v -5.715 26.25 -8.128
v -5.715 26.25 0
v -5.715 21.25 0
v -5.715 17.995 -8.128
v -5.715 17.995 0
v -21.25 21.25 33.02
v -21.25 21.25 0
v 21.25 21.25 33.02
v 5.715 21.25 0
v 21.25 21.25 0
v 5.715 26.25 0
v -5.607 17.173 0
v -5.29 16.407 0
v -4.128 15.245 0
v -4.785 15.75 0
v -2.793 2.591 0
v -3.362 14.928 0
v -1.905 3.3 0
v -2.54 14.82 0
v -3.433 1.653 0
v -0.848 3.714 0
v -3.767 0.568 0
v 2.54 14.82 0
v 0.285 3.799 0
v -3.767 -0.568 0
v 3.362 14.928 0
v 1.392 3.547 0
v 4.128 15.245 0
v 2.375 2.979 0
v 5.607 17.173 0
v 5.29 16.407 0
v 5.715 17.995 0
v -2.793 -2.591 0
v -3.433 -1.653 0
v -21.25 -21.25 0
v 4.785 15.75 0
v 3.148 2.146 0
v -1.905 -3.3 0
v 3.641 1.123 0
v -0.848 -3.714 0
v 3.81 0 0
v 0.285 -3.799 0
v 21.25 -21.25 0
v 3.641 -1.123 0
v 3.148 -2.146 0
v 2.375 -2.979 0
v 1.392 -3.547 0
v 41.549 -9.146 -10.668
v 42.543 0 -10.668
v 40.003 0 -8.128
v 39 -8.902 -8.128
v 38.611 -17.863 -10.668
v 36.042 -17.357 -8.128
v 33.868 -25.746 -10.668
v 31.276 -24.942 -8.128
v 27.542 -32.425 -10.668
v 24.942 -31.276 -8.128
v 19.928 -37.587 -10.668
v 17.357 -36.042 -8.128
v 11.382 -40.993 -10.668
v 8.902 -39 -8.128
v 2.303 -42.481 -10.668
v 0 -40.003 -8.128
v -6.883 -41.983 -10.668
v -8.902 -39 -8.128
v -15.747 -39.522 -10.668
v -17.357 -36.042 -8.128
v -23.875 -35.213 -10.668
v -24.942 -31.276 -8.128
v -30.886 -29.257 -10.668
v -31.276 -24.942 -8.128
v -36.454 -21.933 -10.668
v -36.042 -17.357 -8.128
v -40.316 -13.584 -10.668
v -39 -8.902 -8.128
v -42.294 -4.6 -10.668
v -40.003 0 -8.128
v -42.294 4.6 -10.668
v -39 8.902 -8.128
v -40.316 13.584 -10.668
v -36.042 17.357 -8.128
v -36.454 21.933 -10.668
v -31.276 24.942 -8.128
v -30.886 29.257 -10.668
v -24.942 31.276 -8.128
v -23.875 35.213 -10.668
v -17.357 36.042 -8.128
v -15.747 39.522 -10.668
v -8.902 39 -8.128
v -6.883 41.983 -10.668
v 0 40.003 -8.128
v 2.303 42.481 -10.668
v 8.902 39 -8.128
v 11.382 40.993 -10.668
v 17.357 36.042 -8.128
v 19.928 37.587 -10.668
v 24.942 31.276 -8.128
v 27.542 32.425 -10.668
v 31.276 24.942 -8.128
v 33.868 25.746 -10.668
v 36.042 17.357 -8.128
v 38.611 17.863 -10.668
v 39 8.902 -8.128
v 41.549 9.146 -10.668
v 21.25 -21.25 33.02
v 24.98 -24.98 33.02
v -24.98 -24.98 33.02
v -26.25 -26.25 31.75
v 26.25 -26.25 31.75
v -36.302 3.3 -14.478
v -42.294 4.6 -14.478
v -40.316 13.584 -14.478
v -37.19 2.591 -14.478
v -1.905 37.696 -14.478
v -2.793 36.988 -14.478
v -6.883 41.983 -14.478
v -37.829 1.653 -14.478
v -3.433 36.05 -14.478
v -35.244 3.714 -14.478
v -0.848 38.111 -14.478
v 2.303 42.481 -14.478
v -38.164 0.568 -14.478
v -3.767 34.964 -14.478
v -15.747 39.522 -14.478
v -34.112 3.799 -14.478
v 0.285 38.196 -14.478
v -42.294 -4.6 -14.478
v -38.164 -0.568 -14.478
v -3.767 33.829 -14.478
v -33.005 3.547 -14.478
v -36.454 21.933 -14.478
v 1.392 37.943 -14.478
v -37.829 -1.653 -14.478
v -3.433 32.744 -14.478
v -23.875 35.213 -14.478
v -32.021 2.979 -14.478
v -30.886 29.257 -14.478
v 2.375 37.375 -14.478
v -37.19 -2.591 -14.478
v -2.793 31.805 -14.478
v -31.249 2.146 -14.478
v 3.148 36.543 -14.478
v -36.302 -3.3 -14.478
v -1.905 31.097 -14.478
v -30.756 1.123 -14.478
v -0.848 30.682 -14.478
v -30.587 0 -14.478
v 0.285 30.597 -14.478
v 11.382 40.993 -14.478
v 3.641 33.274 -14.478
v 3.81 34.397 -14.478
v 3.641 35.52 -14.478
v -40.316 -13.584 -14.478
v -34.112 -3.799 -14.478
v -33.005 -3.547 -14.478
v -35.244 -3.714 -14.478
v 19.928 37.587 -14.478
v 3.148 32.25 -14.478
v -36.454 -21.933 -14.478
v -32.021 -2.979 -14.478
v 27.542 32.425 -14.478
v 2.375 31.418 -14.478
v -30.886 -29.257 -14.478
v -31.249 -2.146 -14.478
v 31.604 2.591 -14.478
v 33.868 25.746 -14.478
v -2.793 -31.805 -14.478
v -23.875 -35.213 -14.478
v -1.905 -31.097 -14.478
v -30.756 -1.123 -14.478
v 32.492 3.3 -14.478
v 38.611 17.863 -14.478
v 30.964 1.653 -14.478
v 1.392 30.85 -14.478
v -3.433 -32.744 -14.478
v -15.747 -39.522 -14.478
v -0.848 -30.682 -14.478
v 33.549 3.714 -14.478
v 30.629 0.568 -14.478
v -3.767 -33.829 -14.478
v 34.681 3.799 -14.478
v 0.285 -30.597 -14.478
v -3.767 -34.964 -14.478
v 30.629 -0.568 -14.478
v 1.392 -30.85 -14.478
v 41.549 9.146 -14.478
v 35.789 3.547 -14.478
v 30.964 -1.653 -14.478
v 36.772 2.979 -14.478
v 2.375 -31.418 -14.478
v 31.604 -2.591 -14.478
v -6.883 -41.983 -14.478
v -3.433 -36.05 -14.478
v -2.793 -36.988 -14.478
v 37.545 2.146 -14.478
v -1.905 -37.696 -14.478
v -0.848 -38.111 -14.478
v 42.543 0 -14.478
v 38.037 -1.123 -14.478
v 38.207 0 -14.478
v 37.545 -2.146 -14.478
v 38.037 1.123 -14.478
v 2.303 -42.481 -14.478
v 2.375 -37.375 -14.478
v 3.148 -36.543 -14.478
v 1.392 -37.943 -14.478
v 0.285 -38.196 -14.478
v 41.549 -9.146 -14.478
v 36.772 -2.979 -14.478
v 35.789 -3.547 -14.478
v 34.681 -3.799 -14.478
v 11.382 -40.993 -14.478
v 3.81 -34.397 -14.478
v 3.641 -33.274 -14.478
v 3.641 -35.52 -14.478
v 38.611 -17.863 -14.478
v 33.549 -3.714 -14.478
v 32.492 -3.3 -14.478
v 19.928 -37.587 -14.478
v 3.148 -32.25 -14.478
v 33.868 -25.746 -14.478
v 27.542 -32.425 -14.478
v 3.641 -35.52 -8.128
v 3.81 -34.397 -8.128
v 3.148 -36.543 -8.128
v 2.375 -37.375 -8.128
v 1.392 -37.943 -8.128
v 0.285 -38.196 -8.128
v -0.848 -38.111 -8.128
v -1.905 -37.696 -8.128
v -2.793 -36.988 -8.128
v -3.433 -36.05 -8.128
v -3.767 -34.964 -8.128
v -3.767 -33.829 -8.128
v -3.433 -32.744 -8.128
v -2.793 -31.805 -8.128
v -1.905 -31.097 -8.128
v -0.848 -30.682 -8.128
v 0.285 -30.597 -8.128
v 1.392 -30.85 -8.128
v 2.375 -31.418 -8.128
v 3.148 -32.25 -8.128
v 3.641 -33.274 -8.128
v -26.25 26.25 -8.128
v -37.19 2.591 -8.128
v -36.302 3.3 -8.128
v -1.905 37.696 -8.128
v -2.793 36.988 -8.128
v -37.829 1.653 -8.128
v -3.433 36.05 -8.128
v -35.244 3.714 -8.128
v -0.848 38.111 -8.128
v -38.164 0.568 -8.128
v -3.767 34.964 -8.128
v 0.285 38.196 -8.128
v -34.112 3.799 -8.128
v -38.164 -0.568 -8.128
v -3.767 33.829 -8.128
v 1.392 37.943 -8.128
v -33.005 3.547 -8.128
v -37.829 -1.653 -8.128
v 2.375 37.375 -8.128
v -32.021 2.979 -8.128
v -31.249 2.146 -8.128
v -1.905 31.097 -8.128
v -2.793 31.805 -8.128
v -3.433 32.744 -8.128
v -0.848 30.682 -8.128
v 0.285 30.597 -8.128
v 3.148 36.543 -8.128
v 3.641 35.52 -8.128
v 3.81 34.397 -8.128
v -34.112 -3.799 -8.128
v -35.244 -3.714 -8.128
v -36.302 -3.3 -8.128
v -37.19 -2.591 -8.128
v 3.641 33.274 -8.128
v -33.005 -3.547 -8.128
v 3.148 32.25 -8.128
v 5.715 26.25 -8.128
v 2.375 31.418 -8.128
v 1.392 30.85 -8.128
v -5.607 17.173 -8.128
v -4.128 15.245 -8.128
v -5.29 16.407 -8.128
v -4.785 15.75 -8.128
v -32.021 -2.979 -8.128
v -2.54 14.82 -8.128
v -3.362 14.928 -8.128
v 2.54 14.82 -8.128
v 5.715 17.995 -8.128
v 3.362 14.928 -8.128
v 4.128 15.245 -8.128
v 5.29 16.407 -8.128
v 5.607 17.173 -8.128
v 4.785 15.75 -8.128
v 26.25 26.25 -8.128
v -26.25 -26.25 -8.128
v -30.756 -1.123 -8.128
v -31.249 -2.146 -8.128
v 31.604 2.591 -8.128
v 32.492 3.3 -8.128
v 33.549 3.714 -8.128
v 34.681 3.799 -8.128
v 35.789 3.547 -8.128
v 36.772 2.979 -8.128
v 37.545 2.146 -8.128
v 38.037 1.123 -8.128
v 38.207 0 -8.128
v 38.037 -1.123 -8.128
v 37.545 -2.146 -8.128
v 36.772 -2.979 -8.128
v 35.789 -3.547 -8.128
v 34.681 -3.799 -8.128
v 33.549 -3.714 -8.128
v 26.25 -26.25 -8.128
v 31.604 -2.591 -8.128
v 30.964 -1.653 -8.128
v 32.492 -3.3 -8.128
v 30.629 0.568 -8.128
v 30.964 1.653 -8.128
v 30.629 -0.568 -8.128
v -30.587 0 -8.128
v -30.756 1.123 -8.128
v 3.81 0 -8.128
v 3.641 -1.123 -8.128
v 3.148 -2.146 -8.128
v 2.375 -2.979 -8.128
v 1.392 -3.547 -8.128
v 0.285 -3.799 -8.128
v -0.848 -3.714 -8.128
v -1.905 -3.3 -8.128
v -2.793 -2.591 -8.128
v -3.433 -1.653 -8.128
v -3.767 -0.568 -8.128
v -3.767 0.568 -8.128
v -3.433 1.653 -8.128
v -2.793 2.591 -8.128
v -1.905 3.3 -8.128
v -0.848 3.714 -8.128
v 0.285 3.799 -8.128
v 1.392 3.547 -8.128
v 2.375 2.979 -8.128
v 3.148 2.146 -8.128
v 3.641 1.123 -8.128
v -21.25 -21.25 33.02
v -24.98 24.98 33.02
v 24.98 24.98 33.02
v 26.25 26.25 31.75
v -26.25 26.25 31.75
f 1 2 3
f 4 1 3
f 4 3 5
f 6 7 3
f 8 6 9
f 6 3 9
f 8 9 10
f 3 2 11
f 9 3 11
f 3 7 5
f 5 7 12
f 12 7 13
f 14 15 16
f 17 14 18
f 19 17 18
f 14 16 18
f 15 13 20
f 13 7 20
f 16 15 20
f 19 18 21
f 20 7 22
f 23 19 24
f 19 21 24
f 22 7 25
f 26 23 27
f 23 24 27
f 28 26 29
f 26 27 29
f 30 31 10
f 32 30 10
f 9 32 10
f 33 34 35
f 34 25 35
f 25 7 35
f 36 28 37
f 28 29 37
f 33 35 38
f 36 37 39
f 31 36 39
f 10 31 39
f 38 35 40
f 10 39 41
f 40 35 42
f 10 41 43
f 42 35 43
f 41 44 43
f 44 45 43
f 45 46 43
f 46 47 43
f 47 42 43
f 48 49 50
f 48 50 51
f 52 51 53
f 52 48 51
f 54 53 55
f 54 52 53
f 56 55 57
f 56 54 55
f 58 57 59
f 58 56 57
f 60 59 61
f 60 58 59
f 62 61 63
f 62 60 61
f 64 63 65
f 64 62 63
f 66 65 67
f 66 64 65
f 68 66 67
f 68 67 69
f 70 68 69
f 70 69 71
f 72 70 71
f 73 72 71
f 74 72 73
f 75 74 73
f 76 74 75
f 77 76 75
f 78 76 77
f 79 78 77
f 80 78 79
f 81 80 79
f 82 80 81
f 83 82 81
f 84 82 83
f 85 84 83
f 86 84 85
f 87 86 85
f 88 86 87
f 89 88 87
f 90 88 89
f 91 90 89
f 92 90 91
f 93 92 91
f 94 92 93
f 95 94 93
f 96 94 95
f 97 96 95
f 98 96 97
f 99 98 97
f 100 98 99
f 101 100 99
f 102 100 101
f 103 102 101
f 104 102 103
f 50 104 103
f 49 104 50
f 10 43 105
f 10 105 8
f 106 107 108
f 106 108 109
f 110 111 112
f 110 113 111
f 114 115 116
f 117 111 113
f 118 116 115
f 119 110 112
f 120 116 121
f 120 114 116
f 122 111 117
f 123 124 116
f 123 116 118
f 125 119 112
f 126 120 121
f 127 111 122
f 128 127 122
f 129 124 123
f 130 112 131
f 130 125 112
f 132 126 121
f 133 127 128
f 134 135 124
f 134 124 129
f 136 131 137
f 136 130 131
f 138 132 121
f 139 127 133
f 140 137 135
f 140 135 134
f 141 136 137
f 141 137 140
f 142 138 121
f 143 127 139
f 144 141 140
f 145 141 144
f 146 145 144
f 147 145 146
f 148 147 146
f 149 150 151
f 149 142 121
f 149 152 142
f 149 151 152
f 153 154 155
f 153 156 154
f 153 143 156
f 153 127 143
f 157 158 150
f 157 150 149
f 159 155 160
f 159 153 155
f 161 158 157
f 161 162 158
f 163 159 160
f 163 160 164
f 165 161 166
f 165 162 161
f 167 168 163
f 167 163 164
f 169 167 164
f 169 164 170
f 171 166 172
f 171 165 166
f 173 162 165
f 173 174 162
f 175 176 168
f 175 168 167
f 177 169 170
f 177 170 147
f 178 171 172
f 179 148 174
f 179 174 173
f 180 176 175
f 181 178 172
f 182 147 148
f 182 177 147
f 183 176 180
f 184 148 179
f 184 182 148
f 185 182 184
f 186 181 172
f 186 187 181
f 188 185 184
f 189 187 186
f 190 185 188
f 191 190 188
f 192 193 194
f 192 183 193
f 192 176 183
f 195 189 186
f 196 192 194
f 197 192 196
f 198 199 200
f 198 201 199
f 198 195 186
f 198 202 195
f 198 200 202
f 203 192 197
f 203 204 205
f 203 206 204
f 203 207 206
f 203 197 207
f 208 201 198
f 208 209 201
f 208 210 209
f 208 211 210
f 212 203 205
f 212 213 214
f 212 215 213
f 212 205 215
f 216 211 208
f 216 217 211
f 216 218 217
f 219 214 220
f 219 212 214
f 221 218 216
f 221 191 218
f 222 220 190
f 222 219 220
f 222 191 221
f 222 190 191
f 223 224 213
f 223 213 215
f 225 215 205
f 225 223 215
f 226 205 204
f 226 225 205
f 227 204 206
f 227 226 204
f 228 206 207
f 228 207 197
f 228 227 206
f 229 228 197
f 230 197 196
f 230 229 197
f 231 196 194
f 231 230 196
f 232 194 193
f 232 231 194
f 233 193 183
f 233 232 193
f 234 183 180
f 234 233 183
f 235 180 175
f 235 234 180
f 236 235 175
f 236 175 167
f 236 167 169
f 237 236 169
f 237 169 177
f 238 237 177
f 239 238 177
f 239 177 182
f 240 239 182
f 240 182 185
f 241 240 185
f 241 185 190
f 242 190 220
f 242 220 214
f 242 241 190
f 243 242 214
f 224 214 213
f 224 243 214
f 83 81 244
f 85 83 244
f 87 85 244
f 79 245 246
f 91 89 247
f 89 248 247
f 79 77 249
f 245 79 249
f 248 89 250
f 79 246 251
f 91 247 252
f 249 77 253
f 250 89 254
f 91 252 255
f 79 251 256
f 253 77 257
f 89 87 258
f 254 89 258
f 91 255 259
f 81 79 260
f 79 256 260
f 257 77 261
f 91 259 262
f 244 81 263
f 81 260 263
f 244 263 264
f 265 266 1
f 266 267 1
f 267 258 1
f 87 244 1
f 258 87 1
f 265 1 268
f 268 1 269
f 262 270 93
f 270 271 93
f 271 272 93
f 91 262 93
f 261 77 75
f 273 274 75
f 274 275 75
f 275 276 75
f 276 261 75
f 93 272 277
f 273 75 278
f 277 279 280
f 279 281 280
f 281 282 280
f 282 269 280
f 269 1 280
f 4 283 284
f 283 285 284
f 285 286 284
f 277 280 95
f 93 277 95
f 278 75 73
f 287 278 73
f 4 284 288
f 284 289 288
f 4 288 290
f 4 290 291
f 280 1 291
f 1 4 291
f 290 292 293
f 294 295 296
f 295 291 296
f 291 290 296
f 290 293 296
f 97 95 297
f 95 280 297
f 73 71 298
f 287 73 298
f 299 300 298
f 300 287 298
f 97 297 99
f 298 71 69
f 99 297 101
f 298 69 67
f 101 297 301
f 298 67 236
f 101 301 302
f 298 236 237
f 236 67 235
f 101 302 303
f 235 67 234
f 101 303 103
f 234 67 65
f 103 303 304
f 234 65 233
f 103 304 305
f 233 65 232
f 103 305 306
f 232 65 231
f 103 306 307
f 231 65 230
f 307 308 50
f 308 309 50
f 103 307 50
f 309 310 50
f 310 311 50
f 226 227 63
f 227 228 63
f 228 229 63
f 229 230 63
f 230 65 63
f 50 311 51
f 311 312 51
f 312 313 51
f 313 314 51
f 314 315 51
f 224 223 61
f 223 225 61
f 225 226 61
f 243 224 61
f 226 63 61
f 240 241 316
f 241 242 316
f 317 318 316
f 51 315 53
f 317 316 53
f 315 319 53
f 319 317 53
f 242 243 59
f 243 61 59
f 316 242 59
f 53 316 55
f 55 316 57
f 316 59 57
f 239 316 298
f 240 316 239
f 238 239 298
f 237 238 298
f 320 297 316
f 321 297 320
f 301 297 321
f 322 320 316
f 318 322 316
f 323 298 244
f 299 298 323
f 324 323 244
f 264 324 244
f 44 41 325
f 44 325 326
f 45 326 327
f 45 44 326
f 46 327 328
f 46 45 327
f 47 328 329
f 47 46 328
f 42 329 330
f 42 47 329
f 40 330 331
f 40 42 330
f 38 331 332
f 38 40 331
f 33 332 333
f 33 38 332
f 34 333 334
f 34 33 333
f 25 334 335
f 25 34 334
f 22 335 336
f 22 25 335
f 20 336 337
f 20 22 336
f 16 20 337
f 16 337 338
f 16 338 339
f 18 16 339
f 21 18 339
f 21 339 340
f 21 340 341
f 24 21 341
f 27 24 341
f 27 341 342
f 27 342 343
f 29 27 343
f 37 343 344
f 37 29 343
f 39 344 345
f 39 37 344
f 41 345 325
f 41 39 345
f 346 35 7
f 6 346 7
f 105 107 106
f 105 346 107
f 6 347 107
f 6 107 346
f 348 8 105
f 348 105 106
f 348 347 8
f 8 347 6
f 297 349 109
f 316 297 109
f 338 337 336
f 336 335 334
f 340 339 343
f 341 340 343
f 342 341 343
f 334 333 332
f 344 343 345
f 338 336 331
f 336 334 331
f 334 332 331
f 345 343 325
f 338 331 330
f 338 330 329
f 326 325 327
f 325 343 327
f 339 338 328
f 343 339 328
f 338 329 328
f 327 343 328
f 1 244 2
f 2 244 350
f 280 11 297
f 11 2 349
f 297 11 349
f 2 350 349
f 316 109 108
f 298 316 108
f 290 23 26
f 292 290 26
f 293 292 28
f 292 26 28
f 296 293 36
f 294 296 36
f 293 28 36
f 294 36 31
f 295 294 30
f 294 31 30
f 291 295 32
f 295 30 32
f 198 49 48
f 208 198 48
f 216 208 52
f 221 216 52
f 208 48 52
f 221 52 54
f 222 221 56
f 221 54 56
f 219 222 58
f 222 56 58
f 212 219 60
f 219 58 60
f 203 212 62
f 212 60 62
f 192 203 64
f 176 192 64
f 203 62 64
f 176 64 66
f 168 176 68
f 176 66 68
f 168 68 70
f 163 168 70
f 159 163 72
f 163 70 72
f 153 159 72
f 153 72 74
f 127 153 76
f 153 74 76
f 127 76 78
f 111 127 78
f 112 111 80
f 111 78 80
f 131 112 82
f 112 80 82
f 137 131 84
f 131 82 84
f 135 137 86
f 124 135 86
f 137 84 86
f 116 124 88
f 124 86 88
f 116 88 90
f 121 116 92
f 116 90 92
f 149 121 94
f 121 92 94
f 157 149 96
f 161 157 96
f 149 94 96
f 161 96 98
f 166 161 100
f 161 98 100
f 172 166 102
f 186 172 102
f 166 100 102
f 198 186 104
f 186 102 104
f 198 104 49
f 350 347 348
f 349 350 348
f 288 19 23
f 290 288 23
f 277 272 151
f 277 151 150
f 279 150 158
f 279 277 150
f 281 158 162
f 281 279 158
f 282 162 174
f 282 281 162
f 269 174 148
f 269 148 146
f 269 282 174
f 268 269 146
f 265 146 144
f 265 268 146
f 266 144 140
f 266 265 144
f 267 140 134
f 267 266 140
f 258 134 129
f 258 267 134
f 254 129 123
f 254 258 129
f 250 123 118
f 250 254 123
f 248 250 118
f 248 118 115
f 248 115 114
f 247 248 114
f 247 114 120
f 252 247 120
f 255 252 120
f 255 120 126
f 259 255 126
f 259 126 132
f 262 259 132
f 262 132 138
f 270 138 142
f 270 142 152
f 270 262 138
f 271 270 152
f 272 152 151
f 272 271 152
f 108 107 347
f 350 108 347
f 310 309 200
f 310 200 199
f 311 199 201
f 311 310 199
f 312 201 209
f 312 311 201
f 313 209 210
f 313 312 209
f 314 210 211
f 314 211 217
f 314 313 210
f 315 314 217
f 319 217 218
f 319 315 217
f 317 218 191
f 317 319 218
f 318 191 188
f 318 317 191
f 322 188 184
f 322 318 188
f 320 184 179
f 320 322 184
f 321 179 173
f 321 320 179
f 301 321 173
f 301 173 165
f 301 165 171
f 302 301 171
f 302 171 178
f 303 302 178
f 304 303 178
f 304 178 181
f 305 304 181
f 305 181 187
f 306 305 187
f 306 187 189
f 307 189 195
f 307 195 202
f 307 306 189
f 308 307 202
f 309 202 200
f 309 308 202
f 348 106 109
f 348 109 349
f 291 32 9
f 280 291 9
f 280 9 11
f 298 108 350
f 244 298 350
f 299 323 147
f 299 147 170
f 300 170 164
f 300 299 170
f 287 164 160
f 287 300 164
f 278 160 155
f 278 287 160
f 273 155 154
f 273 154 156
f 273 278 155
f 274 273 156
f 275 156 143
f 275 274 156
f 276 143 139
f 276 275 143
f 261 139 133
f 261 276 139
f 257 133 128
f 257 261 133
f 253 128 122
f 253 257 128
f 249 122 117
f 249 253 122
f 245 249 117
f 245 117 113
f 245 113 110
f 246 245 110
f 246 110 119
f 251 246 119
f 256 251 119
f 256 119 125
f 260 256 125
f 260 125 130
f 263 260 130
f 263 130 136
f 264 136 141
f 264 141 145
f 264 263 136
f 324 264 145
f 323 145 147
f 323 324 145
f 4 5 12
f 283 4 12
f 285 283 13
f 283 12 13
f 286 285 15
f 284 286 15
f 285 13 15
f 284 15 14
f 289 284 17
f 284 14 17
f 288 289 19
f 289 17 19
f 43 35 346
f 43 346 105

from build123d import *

# Parameters (mm, degrees)
F0_W         = 52.5
F0_H         = 52.5
F0_W_2       = 42.5
F0_H_2       = 42.5
F1_DEPTH     = 33.02
F2_R         = 3.81
F1_FACE1_W   = 52.5
F1_FACE1_H   = 52.5
F1_FACE1_W_2 = 42.5
F1_FACE1_H_2 = 42.5
F3_DEPTH     = 8.128
F4_R         = 42.5432713814
F5_DEPTH     = 6.35
F6_SIZE      = 1.27
F7_R         = 3.81
F8_DEPTH     = 6.35
F9_SIZE      = 2.54


with BuildPart() as f1:
    # F0 (on Top) → F1 (new body)
    with BuildSketch(Plane.XY):
        Rectangle(F0_W, F0_H)
        Rectangle(F0_W_2, F0_H_2, mode=Mode.SUBTRACT)
    extrude(amount=F1_DEPTH)

    # F2 (on face) + F1_face1 (on face) → F3 (join)
    with BuildSketch(Plane(origin=(0, 0, 0), x_dir=(1, 0, 0), z_dir=(0, 0, -1))):
        Polygon((26.25, 26.25), (-26.25, 26.25), (-26.25, -26.25), (-5.715, -26.25), (-5.715, -21.25), (-21.25, -21.25), (-21.25, 21.25), (21.25, 21.25), (21.25, -21.25), (5.715, -21.25), (5.715, -26.25), (26.25, -26.25), align=None)
        with BuildLine():
            Line((-21.25, -21.25), (-5.715, -21.25))
            Line((-5.715, -21.25), (-5.715, -17.995))
            ThreePointArc((-5.715, -17.995), (-4.7850640303, -15.7499359697), (-2.54, -14.82))
            Line((-2.54, -14.82), (2.54, -14.82))
            ThreePointArc((2.54, -14.82), (4.7850640303, -15.7499359697), (5.715, -17.995))
            Line((5.715, -17.995), (5.715, -21.25))
            Line((5.715, -21.25), (21.25, -21.25))
            Line((21.25, -21.25), (21.25, 21.25))
            Line((21.25, 21.25), (-21.25, 21.25))
            Line((-21.25, 21.25), (-21.25, -21.25))
        make_face()
        Circle(F2_R, mode=Mode.SUBTRACT)
    with BuildSketch(Plane.XY.offset(33.02)):
        Rectangle(F1_FACE1_W, F1_FACE1_H)
        Rectangle(F1_FACE1_W_2, F1_FACE1_H_2, mode=Mode.SUBTRACT)
    extrude(amount=F3_DEPTH, dir=(0, 0, -1))

    # F4 (on face) → F5 (join)
    with BuildSketch(Plane(origin=(0, 0, -8.128), x_dir=(1, 0, 0), z_dir=(0, 0, -1))):
        Circle(F4_R)
    extrude(amount=F5_DEPTH)

    # F6
    f6_edges = [f1.edges().sort_by_distance(p)[0] for p in [
        (26.25, 0, 33.02),
        (0, 26.25, 33.02),
        (-26.25, 0, 33.02),
        (0, -26.25, 33.02),
    ]]
    chamfer(f6_edges, length=F6_SIZE)

    # F7 (on face) → F8 (cut, through all)
    with BuildSketch(Plane(origin=(0, 0, -8.128), x_dir=(1, 0, 0), z_dir=(0, 0, -1))):
        with Locations((0, 34.3966356907)):
            Circle(F7_R)
        with Locations((34.3966356907, 0)):
            Circle(F7_R)
        with Locations((0, -34.3966356907)):
            Circle(F7_R)
        with Locations((-34.3966356907, 0)):
            Circle(F7_R)
    extrude(amount=F8_DEPTH, mode=Mode.SUBTRACT)

    # F9
    f9_edges = [f1.edges().sort_by_distance(p)[0] for p in [
        (-42.543271, 0, -8.128),
    ]]
    chamfer(f9_edges, length=F9_SIZE)


solid = f1.part
